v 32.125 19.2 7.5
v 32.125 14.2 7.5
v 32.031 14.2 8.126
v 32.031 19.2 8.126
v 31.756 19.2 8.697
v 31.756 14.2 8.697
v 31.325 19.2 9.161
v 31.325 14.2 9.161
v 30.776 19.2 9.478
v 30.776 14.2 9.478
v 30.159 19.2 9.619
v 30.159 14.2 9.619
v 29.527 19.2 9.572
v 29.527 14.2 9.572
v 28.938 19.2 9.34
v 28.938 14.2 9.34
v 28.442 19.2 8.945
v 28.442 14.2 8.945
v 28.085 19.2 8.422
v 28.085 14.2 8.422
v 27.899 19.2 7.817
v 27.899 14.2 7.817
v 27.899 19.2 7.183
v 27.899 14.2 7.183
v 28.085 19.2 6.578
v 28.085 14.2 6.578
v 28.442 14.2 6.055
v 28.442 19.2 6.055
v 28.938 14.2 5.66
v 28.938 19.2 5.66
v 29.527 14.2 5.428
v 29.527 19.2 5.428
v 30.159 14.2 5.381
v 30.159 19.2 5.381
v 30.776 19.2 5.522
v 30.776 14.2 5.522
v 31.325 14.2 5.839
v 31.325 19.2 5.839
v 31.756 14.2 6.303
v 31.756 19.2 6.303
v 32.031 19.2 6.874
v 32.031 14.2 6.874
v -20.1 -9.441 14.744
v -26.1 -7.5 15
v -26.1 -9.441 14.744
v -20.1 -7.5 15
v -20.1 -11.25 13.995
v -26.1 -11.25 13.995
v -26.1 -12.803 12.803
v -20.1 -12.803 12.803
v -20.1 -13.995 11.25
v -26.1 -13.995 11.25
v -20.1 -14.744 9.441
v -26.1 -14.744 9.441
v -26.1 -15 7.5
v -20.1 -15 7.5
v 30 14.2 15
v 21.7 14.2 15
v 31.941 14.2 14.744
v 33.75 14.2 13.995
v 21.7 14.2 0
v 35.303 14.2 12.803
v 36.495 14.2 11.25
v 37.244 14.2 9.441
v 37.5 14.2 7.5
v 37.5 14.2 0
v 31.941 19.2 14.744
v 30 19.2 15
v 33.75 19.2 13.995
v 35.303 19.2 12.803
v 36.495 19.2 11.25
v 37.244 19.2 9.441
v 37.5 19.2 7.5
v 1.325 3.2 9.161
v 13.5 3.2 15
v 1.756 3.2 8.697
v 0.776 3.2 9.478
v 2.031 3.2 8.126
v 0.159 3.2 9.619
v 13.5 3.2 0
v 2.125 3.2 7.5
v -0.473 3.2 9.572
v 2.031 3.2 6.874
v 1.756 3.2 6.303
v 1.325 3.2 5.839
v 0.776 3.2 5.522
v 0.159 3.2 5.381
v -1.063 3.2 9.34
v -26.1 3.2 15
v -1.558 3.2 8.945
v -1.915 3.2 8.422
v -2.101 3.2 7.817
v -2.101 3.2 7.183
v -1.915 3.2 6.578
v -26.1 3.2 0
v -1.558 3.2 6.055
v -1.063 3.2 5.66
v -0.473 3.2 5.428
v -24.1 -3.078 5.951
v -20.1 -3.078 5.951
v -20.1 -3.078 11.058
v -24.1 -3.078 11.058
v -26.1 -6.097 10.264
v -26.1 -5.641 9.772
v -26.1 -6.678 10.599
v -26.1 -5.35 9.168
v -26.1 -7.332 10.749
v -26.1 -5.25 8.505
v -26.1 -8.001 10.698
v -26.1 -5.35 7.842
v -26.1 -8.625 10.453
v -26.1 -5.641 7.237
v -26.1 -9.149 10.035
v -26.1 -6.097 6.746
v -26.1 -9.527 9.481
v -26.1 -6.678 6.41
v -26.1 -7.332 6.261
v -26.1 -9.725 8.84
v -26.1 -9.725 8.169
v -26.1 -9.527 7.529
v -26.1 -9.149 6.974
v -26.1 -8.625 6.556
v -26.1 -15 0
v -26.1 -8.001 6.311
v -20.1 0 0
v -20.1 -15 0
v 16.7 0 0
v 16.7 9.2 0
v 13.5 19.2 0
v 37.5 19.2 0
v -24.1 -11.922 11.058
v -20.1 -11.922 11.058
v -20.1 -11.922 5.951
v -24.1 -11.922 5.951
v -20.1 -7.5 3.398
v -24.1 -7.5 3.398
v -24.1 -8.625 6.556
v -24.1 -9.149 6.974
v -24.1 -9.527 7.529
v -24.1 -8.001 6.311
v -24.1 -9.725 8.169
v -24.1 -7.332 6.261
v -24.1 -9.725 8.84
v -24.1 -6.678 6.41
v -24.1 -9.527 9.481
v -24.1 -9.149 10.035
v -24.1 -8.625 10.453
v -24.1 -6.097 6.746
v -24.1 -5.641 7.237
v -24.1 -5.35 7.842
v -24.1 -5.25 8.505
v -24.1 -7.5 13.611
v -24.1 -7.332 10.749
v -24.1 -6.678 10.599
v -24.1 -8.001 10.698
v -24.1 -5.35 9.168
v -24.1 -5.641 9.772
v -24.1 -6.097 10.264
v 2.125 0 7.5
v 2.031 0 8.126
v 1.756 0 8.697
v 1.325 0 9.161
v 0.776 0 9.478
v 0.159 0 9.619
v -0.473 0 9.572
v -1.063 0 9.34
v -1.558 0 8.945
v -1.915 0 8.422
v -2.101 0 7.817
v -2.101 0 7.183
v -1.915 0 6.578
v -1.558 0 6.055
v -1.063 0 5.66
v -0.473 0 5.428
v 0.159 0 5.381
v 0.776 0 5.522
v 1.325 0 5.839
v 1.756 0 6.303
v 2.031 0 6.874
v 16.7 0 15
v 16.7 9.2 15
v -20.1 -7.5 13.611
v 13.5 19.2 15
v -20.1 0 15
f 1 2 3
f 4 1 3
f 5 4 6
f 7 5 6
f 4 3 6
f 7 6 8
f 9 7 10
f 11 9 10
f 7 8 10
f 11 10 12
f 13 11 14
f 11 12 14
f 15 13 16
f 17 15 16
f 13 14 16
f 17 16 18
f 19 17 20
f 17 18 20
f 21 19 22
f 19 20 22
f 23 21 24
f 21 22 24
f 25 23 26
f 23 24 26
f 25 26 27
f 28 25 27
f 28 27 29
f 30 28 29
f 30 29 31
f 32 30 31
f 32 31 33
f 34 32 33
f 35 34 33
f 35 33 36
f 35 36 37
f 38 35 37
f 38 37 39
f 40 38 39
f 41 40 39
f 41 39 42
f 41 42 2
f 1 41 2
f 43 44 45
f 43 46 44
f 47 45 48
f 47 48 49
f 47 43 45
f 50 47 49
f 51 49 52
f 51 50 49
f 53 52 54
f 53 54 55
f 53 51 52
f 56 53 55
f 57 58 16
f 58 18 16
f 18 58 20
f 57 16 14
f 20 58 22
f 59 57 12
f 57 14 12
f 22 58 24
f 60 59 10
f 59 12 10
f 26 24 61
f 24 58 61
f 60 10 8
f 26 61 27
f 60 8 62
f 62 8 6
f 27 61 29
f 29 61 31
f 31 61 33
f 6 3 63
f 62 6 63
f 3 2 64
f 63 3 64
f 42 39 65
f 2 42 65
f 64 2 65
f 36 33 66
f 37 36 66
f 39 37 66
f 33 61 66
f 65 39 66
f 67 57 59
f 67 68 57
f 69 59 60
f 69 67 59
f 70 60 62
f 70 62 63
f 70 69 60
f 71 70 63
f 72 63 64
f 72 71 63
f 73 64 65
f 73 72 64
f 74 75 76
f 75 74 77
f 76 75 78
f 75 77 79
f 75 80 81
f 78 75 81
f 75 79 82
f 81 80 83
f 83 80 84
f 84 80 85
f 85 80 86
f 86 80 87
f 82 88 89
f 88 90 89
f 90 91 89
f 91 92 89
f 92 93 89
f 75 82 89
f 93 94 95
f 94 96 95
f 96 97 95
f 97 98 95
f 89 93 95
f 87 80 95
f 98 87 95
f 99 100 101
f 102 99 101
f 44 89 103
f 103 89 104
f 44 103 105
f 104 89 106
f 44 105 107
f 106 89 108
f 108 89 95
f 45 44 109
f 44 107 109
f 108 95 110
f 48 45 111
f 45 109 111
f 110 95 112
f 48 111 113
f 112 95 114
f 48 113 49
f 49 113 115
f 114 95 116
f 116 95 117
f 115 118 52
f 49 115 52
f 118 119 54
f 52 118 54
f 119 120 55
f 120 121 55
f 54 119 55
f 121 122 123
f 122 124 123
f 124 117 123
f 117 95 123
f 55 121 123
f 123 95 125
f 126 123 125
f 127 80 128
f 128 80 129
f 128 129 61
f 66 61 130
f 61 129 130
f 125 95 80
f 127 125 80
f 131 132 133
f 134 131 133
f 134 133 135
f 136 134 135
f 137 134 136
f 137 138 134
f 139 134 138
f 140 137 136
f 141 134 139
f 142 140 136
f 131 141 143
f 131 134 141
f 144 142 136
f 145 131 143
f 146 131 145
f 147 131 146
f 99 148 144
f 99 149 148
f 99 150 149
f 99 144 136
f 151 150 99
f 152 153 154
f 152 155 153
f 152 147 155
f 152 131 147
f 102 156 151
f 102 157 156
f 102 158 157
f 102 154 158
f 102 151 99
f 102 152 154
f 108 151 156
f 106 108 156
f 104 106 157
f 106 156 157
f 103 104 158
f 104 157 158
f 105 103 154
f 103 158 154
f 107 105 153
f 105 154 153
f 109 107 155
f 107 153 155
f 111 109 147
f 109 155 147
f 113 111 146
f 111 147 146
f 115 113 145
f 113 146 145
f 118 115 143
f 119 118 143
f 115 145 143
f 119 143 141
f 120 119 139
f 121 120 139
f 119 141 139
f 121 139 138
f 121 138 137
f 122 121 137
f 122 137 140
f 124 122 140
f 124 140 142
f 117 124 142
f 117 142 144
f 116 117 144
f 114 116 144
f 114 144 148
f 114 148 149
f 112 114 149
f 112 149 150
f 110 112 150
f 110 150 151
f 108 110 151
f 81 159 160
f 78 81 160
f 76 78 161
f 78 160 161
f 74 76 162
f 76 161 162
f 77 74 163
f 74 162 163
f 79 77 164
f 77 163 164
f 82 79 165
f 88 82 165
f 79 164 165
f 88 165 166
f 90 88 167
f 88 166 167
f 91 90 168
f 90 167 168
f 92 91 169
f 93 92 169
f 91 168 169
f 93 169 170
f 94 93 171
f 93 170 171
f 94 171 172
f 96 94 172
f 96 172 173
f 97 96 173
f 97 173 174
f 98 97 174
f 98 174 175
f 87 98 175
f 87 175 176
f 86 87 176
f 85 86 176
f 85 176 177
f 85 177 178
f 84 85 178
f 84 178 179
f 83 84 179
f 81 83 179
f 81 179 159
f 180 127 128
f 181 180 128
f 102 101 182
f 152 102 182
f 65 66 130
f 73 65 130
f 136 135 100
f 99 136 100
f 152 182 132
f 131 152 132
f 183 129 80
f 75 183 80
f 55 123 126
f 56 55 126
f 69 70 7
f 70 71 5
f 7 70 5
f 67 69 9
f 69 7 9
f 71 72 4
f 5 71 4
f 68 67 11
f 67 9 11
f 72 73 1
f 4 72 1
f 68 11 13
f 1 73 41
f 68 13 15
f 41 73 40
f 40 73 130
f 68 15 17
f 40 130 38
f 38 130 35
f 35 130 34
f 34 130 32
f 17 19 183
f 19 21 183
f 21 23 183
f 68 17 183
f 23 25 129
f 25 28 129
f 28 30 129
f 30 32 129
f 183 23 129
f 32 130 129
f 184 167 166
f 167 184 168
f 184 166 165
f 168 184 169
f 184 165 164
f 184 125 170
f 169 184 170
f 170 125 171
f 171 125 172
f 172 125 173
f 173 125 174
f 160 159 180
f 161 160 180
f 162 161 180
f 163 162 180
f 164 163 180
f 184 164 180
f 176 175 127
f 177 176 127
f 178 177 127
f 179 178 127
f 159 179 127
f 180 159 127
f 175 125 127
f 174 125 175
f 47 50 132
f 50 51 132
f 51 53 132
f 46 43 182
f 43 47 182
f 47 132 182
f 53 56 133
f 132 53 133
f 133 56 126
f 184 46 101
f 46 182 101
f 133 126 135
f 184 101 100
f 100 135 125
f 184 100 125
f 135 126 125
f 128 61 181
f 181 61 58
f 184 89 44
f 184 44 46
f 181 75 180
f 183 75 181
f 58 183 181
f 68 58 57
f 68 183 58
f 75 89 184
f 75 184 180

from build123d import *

# Parameters (mm, degrees)
F1_DEPTH = 15
F2_R     = 2.125
F3_DEPTH = 25
F4_SIZE  = 5
F5_R     = 7.5
F6_R     = 2.25
F7_DEPTH = 25
F9_DEPTH = 4


# Not quite as in the source:
# - a feature names something its author has since deleted; it is built from what else it names


with BuildPart() as f1:
    # F0 (on Top) → F1 (new body)
    with BuildSketch(Plane.XY):
        Polygon((-16.7, 0), (0, 0), (16.7, 0), (16.7, 14.2), (37.5, 14.2), (37.5, 19.2), (13.5, 19.2), (13.5, 3.2), (0, 3.2), (-13.5, 3.2), (-26.1, 3.2), (-26.1, -15), (-20.1, -15), (-20.1, 0), align=None)
    extrude(amount=F1_DEPTH)

    # F2 (on face) → F3 (cut)
    with BuildSketch(Plane.XZ):
        with Locations((0, 7.5)):
            Circle(F2_R)
        with Locations((30, 7.5)):
            Circle(F2_R)
    extrude(amount=-F3_DEPTH, mode=Mode.SUBTRACT)

    # F4
    f4_edges = [f1.edges().sort_by_distance(p)[0] for p in [
        (16.7, 14.2, 7.5),
    ]]
    chamfer(f4_edges, length=F4_SIZE)

    # F5
    f5_edges = [f1.edges().sort_by_distance(p)[0] for p in [
        (37.5, 16.7, 15),
        (-23.1, -15, 15),
    ]]
    fillet(f5_edges, radius=F5_R)

    # F6 (on face) → F7 (cut)
    with BuildSketch(Plane.YZ.offset(-20.1)):
        with Locations((-7.5, 8.5048094716)):
            Circle(F6_R)
    extrude(amount=-F7_DEPTH, mode=Mode.SUBTRACT)

    # F8 (on face) → F9 (cut)
    with BuildSketch(Plane.YZ.offset(-20.1)):
        Polygon((-3.0775, 5.9514779061), (-3.0775, 11.0581410371), (-7.5, 13.6114726026), (-11.9225, 11.0581410371), (-11.9225, 5.9514779061), (-7.5, 3.3981463406), align=None)
    extrude(amount=-F9_DEPTH, mode=Mode.SUBTRACT)


solid = f1.part
